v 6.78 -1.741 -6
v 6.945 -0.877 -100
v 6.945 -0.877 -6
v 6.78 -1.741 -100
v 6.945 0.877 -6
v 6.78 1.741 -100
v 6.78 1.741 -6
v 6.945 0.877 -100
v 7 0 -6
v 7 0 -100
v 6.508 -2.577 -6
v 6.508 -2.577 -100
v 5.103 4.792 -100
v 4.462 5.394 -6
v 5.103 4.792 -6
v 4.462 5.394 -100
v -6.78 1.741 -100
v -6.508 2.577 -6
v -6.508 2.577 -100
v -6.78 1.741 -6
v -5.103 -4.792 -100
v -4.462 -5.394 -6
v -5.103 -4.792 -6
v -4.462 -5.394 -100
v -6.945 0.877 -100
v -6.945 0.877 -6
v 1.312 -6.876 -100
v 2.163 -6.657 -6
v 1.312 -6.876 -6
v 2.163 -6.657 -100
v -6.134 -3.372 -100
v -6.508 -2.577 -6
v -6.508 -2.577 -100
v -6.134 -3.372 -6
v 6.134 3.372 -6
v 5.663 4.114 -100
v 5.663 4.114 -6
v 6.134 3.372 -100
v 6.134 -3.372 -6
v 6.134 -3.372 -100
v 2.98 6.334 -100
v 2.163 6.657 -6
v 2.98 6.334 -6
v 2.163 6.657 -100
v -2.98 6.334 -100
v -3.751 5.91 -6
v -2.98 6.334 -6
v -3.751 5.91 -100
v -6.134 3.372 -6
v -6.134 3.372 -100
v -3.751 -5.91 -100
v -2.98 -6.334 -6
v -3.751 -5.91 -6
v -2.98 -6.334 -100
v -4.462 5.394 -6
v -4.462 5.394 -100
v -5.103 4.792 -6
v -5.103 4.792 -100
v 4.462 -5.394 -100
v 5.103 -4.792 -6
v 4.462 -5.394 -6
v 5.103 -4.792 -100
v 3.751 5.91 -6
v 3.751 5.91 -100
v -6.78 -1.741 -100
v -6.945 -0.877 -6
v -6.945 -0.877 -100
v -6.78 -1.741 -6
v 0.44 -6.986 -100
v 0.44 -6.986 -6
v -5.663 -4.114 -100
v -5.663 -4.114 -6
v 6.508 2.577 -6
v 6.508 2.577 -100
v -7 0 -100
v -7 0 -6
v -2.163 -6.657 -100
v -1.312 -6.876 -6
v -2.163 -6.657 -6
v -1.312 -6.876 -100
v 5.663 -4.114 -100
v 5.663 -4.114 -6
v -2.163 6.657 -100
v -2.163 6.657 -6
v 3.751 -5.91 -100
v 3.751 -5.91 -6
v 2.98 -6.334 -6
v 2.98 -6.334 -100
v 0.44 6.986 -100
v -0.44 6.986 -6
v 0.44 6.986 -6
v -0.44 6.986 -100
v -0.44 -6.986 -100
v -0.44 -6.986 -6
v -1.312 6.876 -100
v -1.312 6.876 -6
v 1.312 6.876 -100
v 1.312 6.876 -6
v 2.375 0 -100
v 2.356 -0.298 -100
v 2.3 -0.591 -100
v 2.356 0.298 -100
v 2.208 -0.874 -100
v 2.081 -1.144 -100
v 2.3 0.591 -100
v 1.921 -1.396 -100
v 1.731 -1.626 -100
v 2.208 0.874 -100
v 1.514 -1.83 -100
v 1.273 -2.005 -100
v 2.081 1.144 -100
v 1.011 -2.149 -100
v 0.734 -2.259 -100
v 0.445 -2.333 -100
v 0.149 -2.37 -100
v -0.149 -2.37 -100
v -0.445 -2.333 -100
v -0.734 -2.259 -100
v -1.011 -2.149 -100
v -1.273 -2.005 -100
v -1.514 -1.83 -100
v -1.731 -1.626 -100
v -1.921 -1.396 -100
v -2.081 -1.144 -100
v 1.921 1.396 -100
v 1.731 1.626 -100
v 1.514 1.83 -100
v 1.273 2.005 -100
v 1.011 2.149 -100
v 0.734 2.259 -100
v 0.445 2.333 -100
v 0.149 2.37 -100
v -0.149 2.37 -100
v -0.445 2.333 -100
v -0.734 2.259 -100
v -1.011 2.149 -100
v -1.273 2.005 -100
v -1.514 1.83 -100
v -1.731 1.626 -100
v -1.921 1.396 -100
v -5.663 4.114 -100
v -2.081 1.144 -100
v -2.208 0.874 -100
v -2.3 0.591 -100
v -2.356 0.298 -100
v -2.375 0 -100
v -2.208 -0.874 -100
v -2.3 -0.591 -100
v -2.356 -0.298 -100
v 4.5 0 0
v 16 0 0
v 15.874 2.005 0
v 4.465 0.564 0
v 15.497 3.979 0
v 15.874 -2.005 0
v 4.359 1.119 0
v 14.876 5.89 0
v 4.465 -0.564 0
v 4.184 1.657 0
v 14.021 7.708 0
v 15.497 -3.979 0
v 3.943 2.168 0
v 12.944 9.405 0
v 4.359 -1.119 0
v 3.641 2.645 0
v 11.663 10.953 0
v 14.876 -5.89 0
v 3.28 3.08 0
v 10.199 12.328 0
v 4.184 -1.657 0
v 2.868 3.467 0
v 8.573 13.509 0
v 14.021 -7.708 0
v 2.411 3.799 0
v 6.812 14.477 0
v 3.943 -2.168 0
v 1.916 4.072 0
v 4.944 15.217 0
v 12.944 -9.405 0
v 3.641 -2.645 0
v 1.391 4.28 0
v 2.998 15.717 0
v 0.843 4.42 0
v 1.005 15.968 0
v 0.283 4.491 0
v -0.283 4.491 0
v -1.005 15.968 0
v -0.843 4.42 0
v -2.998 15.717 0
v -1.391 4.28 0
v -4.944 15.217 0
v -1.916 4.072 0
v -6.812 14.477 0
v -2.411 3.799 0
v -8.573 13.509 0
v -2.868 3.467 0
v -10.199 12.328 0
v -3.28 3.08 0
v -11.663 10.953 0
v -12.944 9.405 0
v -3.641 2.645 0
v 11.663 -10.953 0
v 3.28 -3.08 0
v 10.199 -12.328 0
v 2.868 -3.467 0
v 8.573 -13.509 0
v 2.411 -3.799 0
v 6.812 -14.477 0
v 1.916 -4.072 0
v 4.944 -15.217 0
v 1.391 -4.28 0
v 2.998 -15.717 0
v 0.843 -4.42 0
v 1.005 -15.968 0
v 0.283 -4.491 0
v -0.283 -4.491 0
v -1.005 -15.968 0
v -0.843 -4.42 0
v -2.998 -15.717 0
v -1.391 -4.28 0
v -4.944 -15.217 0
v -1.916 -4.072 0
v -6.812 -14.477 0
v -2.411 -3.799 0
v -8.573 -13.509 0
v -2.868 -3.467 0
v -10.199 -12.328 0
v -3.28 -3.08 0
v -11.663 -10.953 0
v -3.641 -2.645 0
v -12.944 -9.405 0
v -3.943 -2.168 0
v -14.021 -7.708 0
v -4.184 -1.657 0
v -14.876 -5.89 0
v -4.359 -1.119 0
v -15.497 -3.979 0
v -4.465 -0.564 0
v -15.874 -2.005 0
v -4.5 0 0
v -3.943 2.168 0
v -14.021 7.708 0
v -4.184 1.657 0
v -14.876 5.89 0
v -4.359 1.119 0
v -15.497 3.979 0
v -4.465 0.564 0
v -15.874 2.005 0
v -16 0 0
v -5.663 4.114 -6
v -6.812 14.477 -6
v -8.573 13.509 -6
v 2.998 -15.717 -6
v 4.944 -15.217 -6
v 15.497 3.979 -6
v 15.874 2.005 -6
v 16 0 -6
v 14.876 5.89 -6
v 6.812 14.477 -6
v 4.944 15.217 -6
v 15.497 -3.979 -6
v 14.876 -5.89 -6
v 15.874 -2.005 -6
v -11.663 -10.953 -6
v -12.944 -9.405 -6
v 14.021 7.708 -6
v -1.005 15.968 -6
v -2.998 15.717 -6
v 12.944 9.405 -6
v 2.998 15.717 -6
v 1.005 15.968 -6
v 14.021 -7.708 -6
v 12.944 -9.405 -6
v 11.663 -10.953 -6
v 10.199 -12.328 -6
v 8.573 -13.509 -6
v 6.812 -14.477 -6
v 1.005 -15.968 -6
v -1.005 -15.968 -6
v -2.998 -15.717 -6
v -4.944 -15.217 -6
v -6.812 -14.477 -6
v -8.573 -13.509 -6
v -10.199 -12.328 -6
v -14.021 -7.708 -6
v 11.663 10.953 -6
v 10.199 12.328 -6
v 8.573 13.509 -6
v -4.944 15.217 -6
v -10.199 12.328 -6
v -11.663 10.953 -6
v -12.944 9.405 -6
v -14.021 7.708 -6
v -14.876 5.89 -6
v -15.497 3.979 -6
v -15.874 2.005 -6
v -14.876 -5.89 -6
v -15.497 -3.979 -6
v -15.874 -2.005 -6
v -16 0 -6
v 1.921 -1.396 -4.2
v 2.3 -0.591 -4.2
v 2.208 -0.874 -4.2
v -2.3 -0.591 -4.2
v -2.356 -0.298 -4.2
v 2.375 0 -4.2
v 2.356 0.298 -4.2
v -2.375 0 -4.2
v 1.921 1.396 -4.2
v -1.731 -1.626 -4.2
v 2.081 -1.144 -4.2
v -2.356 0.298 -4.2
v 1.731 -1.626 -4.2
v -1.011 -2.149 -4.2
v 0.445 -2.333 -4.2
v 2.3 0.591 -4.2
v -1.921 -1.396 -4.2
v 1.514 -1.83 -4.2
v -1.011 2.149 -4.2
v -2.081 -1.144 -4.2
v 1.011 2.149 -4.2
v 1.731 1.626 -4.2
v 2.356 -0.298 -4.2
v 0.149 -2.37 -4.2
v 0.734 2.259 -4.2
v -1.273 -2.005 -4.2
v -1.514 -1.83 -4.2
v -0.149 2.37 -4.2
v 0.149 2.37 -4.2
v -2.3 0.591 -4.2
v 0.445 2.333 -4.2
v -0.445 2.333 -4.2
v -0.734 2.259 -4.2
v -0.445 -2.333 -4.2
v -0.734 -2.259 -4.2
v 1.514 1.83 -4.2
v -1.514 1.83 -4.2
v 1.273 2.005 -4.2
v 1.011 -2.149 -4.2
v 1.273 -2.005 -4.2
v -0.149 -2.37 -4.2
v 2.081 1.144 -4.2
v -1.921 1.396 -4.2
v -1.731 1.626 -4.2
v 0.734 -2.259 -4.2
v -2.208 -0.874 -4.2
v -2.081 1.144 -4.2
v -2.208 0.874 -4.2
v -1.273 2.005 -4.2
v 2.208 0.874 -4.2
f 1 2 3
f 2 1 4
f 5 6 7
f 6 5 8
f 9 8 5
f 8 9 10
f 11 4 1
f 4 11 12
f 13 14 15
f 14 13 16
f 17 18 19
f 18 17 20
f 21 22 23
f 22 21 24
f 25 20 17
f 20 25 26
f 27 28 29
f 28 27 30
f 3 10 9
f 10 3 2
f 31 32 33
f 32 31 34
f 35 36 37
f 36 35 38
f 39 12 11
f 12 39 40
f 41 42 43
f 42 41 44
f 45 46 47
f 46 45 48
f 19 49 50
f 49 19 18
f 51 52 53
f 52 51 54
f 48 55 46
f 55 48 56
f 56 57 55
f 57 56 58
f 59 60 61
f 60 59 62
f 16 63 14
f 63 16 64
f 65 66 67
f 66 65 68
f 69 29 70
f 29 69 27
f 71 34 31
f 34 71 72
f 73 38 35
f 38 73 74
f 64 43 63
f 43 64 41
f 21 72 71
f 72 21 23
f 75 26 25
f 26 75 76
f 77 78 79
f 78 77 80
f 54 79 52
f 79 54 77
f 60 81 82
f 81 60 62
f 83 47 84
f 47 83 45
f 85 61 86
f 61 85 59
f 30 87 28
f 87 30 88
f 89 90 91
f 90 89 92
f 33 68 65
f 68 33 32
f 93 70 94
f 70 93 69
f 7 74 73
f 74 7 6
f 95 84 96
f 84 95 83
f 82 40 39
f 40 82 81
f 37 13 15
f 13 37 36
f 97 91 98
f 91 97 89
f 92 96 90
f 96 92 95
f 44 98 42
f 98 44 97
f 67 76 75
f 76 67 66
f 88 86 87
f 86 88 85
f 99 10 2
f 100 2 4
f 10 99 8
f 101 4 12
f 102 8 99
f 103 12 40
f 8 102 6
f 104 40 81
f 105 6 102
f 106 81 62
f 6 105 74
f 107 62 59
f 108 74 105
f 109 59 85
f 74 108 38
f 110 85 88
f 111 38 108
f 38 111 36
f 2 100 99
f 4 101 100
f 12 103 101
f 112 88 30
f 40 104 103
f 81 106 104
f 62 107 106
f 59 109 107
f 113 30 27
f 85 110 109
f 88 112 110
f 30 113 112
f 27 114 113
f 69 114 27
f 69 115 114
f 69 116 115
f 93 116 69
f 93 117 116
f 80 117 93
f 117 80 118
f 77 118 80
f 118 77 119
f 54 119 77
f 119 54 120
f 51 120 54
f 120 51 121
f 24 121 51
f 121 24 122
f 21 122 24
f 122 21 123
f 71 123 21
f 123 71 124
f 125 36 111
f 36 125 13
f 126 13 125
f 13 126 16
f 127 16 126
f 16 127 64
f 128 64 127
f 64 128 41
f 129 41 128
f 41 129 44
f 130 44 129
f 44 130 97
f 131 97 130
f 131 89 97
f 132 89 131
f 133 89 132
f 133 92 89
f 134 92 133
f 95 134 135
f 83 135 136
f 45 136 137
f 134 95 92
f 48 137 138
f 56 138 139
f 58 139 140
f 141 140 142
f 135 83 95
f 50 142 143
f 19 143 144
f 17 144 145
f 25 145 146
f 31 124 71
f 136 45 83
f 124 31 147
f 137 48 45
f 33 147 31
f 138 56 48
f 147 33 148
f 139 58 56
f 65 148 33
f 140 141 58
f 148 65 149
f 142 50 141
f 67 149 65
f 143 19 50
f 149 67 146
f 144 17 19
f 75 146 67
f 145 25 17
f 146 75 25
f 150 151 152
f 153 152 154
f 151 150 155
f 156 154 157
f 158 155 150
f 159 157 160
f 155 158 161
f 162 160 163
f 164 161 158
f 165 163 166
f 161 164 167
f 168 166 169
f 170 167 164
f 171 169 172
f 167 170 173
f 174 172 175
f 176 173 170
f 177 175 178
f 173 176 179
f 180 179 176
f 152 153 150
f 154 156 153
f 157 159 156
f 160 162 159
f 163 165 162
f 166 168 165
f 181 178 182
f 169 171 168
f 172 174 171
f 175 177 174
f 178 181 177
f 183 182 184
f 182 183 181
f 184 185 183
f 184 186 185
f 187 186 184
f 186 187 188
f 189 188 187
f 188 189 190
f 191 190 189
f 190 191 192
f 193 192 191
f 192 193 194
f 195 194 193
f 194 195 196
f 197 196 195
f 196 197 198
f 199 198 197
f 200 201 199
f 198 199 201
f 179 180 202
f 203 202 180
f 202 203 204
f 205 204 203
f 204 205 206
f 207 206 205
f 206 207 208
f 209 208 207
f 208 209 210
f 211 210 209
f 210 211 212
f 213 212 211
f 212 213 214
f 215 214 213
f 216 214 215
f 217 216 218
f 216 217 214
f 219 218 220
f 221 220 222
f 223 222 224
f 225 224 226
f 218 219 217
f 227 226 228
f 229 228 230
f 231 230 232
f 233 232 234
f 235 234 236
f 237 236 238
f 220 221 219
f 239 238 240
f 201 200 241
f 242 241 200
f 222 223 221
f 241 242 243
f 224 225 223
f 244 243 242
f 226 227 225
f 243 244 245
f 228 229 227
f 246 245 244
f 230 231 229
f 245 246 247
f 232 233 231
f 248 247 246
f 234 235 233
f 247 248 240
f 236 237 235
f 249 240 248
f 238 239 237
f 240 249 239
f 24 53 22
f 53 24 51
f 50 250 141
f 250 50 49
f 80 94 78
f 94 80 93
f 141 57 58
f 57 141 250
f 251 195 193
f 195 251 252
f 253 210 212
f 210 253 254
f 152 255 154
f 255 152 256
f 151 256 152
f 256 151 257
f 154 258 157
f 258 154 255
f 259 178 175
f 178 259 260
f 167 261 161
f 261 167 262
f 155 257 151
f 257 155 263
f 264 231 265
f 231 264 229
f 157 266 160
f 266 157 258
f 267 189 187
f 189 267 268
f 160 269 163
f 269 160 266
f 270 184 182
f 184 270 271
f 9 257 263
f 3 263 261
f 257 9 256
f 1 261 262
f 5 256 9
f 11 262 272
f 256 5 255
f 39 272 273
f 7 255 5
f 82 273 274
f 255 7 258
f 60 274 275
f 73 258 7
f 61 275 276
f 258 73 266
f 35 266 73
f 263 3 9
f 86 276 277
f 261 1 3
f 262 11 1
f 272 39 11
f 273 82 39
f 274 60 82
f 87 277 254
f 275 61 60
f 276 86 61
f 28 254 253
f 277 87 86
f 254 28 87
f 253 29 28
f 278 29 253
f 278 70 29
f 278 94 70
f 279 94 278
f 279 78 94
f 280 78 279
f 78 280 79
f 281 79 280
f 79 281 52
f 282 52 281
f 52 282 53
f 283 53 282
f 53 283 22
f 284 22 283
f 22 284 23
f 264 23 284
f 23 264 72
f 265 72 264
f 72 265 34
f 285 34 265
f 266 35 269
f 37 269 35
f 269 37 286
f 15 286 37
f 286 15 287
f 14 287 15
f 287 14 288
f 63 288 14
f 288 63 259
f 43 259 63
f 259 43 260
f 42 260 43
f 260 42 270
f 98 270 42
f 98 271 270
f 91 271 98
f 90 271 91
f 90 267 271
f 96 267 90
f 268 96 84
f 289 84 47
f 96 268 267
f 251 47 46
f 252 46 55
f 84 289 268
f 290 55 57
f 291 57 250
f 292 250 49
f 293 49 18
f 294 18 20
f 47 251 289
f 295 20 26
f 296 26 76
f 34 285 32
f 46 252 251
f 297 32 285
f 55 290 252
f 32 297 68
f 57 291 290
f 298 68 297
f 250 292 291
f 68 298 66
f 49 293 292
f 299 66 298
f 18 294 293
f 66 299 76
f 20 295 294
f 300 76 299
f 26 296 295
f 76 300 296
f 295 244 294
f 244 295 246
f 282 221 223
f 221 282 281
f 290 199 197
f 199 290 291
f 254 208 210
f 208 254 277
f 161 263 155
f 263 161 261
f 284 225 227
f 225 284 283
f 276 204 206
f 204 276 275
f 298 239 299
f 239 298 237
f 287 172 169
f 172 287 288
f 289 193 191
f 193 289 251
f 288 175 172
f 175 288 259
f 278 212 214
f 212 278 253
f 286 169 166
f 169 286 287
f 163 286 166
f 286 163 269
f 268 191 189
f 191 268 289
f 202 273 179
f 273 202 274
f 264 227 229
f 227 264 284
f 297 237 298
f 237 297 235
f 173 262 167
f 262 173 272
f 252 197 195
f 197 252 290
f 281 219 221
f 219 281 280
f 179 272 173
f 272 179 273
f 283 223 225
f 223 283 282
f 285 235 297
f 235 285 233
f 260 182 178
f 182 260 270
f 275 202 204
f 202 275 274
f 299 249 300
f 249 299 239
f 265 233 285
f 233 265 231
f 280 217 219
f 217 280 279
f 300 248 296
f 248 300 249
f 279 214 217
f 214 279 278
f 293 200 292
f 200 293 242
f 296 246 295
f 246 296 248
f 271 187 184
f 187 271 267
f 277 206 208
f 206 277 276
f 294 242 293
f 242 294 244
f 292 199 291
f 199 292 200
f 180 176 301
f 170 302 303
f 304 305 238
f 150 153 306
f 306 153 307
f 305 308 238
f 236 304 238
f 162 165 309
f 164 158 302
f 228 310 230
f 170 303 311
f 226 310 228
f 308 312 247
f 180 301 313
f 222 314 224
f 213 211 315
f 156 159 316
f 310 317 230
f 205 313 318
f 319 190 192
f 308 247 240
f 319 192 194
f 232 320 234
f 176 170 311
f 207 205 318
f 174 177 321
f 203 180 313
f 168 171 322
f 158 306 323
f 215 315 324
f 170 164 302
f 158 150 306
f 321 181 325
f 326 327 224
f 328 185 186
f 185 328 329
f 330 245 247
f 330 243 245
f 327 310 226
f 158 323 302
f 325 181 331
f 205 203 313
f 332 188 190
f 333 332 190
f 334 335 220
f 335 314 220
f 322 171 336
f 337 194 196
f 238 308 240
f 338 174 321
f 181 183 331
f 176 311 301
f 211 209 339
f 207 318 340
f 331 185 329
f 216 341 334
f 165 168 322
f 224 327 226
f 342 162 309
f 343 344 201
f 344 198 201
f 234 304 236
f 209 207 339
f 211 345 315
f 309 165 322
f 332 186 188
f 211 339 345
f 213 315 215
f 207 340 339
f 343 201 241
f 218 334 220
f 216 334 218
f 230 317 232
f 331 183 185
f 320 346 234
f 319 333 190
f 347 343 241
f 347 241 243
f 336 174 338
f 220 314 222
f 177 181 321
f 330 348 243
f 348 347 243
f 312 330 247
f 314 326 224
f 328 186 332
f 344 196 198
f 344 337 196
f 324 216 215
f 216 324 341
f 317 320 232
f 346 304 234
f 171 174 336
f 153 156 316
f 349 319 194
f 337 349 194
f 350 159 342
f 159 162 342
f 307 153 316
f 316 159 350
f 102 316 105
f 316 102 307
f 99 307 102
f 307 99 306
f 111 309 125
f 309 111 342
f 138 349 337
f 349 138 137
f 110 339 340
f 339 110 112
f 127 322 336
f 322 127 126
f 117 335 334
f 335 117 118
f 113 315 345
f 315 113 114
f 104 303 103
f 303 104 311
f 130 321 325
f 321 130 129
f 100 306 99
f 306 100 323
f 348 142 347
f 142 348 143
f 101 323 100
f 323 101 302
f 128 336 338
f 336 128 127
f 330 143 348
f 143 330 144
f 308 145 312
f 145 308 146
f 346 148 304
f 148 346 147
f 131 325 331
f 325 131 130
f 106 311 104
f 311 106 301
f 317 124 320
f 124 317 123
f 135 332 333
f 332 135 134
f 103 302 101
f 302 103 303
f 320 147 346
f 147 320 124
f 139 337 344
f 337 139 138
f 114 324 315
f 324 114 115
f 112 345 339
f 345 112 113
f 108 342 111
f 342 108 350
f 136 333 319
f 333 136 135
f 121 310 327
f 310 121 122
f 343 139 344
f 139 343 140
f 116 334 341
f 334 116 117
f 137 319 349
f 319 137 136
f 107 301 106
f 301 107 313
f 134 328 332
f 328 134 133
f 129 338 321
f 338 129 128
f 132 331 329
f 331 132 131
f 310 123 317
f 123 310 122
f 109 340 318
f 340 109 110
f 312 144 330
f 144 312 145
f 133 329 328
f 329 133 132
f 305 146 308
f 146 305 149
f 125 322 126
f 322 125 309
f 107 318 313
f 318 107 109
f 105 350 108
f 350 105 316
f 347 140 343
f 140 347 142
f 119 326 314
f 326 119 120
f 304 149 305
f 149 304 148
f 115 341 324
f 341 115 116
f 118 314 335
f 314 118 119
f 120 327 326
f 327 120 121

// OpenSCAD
$fn = 50;


difference() {
	union() {
		translate(v = [0, 0, -100.0000000000]) {
			cylinder(h = 100, r = 7.0000000000);
		}
		translate(v = [0, 0, -6.0000000000]) {
			cylinder(h = 6, r = 16.0000000000);
		}
	}
	union() {
		translate(v = [0, 0, 0]) {
			rotate(a = [0, 0, 0]) {
				difference() {
					union() {
						#translate(v = [0, 0, -100.0000000000]) {
							cylinder(h = 100, r = 2.2500000000);
						}
						#translate(v = [0, 0, -4.2000000000]) {
							cylinder(h = 4.2000000000, r1 = 2.3750000000, r2 = 4.5000000000);
						}
						#translate(v = [0, 0, -100.0000000000]) {
							cylinder(h = 100, r = 2.3750000000);
						}
						#translate(v = [0, 0, -100.0000000000]) {
							cylinder(h = 100, r = 2.2500000000);
						}
					}
					union();
				}
			}
		}
	}
}
